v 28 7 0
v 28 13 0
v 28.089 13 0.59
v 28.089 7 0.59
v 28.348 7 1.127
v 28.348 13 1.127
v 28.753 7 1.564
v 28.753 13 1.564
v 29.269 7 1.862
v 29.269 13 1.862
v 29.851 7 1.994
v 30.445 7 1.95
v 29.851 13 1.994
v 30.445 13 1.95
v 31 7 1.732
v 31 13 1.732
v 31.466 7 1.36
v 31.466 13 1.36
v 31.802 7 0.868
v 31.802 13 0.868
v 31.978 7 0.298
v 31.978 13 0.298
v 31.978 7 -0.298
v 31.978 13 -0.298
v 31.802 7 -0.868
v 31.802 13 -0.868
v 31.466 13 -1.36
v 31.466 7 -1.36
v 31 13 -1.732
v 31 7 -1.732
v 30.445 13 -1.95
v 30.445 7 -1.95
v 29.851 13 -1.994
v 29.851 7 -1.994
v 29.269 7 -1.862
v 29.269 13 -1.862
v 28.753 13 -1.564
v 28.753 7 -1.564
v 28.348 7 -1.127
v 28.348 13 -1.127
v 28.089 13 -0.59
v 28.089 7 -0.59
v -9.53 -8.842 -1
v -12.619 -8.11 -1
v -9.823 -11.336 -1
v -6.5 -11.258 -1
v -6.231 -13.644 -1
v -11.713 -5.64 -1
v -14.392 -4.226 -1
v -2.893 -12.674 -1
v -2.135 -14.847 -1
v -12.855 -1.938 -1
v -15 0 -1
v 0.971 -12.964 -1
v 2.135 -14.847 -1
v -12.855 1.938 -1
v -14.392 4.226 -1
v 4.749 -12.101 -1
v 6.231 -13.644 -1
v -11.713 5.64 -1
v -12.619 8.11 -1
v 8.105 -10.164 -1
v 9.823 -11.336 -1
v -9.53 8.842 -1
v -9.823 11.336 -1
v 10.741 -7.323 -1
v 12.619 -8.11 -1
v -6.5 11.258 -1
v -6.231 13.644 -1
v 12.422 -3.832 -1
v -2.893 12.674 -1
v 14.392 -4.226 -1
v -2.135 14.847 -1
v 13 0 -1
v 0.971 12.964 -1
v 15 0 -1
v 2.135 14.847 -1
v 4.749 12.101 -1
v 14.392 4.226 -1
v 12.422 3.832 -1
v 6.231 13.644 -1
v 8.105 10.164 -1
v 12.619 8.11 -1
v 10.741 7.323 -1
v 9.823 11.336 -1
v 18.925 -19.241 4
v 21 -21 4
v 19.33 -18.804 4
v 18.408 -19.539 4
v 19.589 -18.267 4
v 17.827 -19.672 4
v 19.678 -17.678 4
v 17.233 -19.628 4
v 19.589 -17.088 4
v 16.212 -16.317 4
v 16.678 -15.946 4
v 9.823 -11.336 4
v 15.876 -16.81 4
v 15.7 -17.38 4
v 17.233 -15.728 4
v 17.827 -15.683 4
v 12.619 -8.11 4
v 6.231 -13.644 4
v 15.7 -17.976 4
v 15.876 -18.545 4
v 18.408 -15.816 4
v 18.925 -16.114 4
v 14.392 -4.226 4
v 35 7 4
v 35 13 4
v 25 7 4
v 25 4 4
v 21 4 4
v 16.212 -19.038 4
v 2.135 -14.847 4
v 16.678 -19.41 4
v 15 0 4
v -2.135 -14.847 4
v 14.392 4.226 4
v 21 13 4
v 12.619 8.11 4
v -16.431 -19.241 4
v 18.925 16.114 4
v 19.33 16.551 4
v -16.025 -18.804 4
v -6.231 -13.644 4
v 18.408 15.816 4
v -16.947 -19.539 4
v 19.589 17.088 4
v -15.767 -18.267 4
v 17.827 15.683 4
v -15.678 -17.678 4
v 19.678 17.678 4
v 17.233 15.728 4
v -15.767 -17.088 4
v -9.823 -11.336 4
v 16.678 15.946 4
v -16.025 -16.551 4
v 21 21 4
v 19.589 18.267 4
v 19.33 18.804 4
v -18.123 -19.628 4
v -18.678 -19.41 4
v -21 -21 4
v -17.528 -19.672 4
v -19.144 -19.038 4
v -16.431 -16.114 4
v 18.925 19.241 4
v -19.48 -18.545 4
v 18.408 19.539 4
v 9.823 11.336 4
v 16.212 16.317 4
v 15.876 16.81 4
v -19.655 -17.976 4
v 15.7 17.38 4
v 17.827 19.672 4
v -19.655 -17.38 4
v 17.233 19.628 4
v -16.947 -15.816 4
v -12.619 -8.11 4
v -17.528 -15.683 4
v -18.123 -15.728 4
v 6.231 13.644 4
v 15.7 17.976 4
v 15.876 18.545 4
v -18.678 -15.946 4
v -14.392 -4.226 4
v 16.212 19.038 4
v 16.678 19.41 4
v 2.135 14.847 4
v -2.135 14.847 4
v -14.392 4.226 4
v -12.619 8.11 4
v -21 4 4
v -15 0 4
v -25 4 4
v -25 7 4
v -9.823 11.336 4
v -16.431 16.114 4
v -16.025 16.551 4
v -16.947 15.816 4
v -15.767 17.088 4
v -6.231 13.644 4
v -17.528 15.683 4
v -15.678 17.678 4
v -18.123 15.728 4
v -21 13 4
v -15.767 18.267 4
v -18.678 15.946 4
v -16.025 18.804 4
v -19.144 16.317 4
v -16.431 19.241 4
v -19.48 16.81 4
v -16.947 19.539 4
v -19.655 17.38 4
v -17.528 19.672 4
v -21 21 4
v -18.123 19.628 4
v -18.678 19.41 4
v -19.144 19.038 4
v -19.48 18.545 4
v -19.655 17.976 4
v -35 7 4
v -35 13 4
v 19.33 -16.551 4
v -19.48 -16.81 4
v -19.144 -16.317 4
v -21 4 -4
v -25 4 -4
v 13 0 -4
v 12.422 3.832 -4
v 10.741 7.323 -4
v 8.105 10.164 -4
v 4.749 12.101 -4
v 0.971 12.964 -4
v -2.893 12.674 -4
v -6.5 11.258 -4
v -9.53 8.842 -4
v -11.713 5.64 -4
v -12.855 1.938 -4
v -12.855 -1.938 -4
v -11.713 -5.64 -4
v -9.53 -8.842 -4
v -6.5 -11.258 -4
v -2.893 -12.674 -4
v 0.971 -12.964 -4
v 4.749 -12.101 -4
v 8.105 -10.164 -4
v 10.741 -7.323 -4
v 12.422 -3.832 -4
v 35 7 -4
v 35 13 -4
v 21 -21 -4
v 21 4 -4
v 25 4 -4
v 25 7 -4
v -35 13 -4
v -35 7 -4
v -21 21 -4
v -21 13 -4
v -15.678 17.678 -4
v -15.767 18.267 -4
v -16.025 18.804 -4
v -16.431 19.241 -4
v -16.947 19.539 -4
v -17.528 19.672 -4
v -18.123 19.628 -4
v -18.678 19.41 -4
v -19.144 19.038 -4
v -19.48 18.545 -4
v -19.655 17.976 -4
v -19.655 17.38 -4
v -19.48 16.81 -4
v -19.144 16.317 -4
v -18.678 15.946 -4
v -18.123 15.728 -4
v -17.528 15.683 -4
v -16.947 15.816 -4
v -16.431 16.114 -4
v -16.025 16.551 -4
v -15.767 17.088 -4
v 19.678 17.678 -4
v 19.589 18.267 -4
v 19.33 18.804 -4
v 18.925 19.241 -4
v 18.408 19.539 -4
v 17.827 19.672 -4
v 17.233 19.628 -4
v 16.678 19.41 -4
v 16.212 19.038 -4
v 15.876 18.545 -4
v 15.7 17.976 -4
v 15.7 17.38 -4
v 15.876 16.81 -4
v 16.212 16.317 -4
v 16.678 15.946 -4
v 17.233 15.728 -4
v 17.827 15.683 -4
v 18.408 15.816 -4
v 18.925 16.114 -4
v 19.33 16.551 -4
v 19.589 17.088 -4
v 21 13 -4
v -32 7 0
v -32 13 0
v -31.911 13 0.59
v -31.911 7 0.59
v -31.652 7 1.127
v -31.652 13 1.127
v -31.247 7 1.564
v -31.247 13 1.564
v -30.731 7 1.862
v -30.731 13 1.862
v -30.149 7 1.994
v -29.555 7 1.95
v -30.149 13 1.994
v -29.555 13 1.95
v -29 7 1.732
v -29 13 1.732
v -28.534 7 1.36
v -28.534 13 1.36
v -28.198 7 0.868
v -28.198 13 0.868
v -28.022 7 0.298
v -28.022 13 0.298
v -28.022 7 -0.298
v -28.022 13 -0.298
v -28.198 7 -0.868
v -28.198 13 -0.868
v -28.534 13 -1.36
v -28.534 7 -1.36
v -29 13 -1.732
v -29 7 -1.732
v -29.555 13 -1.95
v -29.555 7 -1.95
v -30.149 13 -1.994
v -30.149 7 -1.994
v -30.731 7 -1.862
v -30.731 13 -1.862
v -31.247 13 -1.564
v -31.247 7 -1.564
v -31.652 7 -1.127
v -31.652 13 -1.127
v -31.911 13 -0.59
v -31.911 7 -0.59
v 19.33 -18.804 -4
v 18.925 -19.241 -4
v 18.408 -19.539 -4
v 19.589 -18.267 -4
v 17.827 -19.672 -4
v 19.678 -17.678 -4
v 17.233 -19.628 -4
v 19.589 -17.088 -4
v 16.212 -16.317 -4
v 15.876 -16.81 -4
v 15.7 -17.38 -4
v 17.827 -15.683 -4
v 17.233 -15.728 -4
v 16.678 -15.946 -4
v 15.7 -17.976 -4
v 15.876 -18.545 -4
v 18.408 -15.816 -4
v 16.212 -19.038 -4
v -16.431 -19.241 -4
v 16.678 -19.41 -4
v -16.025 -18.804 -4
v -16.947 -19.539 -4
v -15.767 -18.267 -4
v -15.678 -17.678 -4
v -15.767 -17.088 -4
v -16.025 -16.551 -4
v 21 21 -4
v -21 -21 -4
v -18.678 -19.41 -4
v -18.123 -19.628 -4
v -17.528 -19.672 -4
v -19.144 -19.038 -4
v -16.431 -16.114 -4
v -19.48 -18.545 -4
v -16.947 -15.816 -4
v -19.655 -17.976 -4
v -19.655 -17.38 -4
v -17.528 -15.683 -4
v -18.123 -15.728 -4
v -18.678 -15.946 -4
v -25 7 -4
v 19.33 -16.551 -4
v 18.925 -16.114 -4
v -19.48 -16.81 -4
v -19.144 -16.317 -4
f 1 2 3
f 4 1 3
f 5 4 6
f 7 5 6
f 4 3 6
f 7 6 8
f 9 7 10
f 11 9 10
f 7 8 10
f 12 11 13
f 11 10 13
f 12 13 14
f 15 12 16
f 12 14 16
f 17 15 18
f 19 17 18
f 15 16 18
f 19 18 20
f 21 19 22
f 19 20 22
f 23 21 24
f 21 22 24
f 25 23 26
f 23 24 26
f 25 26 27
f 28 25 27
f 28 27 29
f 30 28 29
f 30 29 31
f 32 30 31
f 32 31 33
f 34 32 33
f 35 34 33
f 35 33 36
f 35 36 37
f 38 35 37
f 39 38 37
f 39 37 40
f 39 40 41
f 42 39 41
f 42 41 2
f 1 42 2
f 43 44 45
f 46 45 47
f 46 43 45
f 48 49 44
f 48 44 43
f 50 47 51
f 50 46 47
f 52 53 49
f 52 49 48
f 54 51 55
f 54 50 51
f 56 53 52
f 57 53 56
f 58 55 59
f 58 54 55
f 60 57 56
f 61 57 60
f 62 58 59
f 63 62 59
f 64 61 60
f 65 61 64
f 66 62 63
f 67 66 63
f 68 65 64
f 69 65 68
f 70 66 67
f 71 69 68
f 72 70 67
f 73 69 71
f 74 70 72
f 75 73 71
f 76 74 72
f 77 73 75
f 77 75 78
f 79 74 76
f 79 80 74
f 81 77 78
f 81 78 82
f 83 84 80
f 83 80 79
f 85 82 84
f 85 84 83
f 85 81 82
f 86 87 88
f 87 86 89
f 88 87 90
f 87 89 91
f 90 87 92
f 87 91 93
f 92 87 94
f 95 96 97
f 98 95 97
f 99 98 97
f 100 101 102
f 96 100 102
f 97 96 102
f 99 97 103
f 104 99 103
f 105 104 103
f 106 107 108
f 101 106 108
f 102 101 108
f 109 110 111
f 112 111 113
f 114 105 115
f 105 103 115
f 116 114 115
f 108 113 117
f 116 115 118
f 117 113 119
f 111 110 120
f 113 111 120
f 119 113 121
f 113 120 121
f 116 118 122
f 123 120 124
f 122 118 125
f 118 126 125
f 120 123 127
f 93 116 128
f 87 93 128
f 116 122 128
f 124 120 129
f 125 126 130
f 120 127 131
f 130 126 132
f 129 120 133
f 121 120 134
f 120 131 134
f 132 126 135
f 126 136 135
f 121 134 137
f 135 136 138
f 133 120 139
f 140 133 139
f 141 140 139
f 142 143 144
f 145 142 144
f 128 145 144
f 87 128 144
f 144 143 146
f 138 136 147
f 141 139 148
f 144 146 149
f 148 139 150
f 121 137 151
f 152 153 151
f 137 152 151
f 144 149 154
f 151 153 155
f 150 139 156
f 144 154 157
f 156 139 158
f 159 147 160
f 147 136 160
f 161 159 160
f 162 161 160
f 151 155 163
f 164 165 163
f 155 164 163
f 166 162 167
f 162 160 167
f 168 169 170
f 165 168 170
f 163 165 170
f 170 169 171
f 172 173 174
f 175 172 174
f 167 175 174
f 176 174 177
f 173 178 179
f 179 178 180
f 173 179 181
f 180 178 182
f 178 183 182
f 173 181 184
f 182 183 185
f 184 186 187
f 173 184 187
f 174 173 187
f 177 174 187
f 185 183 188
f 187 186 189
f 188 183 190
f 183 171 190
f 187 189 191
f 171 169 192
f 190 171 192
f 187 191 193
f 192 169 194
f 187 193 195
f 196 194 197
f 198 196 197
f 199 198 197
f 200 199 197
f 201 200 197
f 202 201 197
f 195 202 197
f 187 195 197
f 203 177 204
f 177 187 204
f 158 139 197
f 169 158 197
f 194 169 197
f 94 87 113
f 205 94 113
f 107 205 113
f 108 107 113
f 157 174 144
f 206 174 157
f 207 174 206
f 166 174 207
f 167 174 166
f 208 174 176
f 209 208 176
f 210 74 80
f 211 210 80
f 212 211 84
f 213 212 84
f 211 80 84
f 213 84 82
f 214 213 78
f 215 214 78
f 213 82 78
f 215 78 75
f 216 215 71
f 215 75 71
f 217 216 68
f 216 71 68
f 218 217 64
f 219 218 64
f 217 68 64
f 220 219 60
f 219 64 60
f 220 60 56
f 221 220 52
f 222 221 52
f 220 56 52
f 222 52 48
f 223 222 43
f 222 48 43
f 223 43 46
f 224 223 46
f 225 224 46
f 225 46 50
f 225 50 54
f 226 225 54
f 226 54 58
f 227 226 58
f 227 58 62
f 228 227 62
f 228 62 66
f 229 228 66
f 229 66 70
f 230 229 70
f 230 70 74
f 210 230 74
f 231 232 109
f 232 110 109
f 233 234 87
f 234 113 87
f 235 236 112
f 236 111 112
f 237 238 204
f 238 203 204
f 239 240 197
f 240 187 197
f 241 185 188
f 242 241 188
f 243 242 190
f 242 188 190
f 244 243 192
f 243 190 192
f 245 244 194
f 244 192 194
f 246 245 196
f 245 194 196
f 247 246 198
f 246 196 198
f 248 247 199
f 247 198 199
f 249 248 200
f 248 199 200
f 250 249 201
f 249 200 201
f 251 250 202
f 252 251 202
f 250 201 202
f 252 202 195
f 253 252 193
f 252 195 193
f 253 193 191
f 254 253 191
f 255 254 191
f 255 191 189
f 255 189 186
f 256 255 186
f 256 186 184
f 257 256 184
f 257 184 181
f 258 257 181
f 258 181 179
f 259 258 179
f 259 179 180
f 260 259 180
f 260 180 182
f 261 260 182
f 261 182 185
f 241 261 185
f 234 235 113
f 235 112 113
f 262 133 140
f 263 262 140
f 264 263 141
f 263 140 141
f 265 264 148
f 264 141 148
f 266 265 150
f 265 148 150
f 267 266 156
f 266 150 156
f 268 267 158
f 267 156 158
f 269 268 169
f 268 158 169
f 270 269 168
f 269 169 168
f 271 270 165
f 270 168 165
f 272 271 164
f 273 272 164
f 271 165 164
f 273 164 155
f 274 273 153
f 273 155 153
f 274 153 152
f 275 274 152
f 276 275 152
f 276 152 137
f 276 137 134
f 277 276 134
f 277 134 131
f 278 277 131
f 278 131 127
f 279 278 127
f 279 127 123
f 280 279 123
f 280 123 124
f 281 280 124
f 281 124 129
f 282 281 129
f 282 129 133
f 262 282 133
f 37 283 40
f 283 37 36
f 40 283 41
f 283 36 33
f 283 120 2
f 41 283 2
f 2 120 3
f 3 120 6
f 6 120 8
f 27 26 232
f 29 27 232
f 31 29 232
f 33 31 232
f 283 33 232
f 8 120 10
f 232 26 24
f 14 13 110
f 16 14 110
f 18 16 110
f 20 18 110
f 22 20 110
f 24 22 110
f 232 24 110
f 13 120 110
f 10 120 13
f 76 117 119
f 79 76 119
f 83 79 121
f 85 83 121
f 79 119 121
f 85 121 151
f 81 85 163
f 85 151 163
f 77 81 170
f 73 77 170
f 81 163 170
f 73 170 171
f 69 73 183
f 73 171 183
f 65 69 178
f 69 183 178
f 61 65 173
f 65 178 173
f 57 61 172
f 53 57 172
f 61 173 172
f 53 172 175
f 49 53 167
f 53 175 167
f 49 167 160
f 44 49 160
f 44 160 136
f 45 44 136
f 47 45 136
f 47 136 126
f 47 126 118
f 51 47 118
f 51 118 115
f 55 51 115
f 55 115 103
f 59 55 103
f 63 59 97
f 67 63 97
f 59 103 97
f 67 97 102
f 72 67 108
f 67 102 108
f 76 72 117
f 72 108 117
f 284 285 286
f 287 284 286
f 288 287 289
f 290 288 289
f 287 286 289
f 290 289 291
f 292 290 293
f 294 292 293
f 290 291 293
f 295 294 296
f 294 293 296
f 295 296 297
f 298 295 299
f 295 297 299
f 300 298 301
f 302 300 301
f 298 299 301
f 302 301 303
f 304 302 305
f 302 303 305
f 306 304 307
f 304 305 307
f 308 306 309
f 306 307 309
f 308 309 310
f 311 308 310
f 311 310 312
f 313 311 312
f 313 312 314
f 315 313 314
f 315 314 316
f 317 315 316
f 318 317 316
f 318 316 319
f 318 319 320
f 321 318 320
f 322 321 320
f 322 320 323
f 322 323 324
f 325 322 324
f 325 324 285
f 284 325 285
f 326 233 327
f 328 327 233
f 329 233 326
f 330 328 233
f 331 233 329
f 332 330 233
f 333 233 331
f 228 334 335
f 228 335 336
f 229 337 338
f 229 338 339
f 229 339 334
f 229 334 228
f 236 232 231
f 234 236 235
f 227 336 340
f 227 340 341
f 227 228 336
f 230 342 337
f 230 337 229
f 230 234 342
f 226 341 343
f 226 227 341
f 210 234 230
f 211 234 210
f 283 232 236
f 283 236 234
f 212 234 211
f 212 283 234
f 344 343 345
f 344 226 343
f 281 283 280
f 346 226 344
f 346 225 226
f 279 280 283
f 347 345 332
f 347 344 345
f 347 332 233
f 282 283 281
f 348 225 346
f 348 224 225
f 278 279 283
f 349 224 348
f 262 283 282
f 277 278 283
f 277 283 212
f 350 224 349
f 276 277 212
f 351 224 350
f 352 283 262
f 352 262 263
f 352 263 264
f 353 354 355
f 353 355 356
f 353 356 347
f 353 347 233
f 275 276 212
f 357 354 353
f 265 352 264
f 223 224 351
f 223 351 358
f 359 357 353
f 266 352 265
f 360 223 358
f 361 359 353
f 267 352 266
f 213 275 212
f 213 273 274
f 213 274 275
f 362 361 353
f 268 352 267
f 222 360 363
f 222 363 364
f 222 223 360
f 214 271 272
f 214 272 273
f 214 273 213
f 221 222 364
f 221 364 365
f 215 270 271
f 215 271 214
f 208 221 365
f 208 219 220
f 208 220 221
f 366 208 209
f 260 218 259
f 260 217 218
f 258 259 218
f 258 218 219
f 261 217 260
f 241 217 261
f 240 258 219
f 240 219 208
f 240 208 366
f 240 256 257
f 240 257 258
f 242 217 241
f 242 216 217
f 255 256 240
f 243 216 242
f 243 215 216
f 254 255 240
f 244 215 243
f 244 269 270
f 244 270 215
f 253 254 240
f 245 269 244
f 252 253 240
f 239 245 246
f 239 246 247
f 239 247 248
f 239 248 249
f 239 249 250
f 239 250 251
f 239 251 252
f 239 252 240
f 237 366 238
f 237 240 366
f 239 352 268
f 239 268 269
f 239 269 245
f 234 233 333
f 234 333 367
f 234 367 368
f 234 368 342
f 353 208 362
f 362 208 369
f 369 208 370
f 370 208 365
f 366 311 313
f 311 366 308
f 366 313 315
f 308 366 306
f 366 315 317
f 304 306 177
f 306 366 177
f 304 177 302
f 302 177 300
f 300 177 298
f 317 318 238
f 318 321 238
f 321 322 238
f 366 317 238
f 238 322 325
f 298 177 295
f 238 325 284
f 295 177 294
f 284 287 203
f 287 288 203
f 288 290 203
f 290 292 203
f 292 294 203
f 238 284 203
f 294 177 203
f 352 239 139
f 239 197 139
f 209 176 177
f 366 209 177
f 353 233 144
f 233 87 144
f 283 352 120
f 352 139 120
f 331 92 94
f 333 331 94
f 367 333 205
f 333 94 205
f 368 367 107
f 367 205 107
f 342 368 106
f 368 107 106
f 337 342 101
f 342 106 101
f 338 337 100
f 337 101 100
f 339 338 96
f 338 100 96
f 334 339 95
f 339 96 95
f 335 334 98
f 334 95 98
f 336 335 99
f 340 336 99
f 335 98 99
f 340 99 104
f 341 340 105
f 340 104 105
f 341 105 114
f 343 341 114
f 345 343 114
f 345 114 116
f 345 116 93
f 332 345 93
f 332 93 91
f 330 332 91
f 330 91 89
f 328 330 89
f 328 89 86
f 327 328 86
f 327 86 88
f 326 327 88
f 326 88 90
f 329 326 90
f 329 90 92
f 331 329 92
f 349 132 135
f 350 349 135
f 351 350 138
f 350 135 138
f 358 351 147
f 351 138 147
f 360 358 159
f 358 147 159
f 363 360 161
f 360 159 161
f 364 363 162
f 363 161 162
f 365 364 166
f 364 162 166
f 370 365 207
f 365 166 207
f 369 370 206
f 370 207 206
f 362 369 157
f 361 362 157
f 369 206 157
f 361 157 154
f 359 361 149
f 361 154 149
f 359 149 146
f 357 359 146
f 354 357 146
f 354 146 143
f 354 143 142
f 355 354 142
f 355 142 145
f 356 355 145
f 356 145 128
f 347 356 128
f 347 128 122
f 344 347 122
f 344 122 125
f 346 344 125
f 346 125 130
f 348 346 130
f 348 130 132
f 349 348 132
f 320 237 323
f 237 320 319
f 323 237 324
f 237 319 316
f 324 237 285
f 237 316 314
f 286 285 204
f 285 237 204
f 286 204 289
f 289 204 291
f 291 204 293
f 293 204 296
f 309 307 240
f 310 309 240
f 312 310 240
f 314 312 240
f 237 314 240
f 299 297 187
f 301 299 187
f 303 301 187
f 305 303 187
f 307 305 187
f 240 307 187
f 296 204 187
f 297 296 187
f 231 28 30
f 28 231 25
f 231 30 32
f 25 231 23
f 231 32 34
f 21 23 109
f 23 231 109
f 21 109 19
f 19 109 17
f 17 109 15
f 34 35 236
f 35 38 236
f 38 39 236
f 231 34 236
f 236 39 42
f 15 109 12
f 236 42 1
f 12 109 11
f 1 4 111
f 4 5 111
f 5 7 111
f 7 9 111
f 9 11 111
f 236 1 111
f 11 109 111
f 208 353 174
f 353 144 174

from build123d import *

# Parameters (mm, degrees)
EXTRUDE_1_DEPTH     = 4
SKETCH_3_R          = 15
CUT_EXTRUDE_1_DEPTH = 5
SKETCH_4_R          = 2
CUT_EXTRUDE_2_DEPTH = 42.593268686
SKETCH_5_R          = 2
CUT_EXTRUDE_3_DEPTH = 49.95916666
SKETCH_6_R          = 13
CUT_EXTRUDE_4_DEPTH = 42.12177039


with BuildPart() as part:
    # 草图2 → 凸台-拉伸1 (new, symmetric)
    with BuildSketch(Plane.XY):
        Polygon((-25, 7), (-35, 7), (-35, 13), (-21, 13), (-21, 21), (21, 21), (21, 13), (35, 13), (35, 7), (25, 7), (25, 4), (21, 4), (21, -21), (-21, -21), (-21, 4), (-25, 4), align=None)
    extrude(amount=EXTRUDE_1_DEPTH, both=True)

    # 草图3 → 切除-拉伸1 (cut)
    with BuildSketch(Plane.XY.offset(4)):
        Circle(SKETCH_3_R)
    extrude(amount=-CUT_EXTRUDE_1_DEPTH, mode=Mode.SUBTRACT)

    # 草图4 → 切除-拉伸2 (cut, through all)
    with BuildSketch(Plane.XY.offset(4)):
        with Locations((-17.67766953, 17.67766953)):
            Circle(SKETCH_4_R)
        with Locations((17.67766953, 17.67766953)):
            Circle(SKETCH_4_R)
        with Locations((17.67766953, -17.67766953)):
            Circle(SKETCH_4_R)
        with Locations((-17.67766953, -17.67766953)):
            Circle(SKETCH_4_R)
    extrude(amount=-CUT_EXTRUDE_2_DEPTH, mode=Mode.SUBTRACT)

    # 草图5 → 切除-拉伸3 (cut, through all)
    with BuildSketch(Plane(origin=(0, 13, 0), x_dir=(1, 0, 0), z_dir=(0, 1, 0))):
        with Locations(Location((-30, 0, 0), (0, 0, 180))):
            Circle(SKETCH_5_R)
        with Locations(Location((30, 0, 0), (0, 0, 180))):
            Circle(SKETCH_5_R)
    extrude(amount=-CUT_EXTRUDE_3_DEPTH, mode=Mode.SUBTRACT)

    # 草图6 → 切除-拉伸4 (cut, through all)
    with BuildSketch(Plane.XY.offset(-1)):
        Circle(SKETCH_6_R)
    extrude(amount=-CUT_EXTRUDE_4_DEPTH, mode=Mode.SUBTRACT)


solid = part.part
